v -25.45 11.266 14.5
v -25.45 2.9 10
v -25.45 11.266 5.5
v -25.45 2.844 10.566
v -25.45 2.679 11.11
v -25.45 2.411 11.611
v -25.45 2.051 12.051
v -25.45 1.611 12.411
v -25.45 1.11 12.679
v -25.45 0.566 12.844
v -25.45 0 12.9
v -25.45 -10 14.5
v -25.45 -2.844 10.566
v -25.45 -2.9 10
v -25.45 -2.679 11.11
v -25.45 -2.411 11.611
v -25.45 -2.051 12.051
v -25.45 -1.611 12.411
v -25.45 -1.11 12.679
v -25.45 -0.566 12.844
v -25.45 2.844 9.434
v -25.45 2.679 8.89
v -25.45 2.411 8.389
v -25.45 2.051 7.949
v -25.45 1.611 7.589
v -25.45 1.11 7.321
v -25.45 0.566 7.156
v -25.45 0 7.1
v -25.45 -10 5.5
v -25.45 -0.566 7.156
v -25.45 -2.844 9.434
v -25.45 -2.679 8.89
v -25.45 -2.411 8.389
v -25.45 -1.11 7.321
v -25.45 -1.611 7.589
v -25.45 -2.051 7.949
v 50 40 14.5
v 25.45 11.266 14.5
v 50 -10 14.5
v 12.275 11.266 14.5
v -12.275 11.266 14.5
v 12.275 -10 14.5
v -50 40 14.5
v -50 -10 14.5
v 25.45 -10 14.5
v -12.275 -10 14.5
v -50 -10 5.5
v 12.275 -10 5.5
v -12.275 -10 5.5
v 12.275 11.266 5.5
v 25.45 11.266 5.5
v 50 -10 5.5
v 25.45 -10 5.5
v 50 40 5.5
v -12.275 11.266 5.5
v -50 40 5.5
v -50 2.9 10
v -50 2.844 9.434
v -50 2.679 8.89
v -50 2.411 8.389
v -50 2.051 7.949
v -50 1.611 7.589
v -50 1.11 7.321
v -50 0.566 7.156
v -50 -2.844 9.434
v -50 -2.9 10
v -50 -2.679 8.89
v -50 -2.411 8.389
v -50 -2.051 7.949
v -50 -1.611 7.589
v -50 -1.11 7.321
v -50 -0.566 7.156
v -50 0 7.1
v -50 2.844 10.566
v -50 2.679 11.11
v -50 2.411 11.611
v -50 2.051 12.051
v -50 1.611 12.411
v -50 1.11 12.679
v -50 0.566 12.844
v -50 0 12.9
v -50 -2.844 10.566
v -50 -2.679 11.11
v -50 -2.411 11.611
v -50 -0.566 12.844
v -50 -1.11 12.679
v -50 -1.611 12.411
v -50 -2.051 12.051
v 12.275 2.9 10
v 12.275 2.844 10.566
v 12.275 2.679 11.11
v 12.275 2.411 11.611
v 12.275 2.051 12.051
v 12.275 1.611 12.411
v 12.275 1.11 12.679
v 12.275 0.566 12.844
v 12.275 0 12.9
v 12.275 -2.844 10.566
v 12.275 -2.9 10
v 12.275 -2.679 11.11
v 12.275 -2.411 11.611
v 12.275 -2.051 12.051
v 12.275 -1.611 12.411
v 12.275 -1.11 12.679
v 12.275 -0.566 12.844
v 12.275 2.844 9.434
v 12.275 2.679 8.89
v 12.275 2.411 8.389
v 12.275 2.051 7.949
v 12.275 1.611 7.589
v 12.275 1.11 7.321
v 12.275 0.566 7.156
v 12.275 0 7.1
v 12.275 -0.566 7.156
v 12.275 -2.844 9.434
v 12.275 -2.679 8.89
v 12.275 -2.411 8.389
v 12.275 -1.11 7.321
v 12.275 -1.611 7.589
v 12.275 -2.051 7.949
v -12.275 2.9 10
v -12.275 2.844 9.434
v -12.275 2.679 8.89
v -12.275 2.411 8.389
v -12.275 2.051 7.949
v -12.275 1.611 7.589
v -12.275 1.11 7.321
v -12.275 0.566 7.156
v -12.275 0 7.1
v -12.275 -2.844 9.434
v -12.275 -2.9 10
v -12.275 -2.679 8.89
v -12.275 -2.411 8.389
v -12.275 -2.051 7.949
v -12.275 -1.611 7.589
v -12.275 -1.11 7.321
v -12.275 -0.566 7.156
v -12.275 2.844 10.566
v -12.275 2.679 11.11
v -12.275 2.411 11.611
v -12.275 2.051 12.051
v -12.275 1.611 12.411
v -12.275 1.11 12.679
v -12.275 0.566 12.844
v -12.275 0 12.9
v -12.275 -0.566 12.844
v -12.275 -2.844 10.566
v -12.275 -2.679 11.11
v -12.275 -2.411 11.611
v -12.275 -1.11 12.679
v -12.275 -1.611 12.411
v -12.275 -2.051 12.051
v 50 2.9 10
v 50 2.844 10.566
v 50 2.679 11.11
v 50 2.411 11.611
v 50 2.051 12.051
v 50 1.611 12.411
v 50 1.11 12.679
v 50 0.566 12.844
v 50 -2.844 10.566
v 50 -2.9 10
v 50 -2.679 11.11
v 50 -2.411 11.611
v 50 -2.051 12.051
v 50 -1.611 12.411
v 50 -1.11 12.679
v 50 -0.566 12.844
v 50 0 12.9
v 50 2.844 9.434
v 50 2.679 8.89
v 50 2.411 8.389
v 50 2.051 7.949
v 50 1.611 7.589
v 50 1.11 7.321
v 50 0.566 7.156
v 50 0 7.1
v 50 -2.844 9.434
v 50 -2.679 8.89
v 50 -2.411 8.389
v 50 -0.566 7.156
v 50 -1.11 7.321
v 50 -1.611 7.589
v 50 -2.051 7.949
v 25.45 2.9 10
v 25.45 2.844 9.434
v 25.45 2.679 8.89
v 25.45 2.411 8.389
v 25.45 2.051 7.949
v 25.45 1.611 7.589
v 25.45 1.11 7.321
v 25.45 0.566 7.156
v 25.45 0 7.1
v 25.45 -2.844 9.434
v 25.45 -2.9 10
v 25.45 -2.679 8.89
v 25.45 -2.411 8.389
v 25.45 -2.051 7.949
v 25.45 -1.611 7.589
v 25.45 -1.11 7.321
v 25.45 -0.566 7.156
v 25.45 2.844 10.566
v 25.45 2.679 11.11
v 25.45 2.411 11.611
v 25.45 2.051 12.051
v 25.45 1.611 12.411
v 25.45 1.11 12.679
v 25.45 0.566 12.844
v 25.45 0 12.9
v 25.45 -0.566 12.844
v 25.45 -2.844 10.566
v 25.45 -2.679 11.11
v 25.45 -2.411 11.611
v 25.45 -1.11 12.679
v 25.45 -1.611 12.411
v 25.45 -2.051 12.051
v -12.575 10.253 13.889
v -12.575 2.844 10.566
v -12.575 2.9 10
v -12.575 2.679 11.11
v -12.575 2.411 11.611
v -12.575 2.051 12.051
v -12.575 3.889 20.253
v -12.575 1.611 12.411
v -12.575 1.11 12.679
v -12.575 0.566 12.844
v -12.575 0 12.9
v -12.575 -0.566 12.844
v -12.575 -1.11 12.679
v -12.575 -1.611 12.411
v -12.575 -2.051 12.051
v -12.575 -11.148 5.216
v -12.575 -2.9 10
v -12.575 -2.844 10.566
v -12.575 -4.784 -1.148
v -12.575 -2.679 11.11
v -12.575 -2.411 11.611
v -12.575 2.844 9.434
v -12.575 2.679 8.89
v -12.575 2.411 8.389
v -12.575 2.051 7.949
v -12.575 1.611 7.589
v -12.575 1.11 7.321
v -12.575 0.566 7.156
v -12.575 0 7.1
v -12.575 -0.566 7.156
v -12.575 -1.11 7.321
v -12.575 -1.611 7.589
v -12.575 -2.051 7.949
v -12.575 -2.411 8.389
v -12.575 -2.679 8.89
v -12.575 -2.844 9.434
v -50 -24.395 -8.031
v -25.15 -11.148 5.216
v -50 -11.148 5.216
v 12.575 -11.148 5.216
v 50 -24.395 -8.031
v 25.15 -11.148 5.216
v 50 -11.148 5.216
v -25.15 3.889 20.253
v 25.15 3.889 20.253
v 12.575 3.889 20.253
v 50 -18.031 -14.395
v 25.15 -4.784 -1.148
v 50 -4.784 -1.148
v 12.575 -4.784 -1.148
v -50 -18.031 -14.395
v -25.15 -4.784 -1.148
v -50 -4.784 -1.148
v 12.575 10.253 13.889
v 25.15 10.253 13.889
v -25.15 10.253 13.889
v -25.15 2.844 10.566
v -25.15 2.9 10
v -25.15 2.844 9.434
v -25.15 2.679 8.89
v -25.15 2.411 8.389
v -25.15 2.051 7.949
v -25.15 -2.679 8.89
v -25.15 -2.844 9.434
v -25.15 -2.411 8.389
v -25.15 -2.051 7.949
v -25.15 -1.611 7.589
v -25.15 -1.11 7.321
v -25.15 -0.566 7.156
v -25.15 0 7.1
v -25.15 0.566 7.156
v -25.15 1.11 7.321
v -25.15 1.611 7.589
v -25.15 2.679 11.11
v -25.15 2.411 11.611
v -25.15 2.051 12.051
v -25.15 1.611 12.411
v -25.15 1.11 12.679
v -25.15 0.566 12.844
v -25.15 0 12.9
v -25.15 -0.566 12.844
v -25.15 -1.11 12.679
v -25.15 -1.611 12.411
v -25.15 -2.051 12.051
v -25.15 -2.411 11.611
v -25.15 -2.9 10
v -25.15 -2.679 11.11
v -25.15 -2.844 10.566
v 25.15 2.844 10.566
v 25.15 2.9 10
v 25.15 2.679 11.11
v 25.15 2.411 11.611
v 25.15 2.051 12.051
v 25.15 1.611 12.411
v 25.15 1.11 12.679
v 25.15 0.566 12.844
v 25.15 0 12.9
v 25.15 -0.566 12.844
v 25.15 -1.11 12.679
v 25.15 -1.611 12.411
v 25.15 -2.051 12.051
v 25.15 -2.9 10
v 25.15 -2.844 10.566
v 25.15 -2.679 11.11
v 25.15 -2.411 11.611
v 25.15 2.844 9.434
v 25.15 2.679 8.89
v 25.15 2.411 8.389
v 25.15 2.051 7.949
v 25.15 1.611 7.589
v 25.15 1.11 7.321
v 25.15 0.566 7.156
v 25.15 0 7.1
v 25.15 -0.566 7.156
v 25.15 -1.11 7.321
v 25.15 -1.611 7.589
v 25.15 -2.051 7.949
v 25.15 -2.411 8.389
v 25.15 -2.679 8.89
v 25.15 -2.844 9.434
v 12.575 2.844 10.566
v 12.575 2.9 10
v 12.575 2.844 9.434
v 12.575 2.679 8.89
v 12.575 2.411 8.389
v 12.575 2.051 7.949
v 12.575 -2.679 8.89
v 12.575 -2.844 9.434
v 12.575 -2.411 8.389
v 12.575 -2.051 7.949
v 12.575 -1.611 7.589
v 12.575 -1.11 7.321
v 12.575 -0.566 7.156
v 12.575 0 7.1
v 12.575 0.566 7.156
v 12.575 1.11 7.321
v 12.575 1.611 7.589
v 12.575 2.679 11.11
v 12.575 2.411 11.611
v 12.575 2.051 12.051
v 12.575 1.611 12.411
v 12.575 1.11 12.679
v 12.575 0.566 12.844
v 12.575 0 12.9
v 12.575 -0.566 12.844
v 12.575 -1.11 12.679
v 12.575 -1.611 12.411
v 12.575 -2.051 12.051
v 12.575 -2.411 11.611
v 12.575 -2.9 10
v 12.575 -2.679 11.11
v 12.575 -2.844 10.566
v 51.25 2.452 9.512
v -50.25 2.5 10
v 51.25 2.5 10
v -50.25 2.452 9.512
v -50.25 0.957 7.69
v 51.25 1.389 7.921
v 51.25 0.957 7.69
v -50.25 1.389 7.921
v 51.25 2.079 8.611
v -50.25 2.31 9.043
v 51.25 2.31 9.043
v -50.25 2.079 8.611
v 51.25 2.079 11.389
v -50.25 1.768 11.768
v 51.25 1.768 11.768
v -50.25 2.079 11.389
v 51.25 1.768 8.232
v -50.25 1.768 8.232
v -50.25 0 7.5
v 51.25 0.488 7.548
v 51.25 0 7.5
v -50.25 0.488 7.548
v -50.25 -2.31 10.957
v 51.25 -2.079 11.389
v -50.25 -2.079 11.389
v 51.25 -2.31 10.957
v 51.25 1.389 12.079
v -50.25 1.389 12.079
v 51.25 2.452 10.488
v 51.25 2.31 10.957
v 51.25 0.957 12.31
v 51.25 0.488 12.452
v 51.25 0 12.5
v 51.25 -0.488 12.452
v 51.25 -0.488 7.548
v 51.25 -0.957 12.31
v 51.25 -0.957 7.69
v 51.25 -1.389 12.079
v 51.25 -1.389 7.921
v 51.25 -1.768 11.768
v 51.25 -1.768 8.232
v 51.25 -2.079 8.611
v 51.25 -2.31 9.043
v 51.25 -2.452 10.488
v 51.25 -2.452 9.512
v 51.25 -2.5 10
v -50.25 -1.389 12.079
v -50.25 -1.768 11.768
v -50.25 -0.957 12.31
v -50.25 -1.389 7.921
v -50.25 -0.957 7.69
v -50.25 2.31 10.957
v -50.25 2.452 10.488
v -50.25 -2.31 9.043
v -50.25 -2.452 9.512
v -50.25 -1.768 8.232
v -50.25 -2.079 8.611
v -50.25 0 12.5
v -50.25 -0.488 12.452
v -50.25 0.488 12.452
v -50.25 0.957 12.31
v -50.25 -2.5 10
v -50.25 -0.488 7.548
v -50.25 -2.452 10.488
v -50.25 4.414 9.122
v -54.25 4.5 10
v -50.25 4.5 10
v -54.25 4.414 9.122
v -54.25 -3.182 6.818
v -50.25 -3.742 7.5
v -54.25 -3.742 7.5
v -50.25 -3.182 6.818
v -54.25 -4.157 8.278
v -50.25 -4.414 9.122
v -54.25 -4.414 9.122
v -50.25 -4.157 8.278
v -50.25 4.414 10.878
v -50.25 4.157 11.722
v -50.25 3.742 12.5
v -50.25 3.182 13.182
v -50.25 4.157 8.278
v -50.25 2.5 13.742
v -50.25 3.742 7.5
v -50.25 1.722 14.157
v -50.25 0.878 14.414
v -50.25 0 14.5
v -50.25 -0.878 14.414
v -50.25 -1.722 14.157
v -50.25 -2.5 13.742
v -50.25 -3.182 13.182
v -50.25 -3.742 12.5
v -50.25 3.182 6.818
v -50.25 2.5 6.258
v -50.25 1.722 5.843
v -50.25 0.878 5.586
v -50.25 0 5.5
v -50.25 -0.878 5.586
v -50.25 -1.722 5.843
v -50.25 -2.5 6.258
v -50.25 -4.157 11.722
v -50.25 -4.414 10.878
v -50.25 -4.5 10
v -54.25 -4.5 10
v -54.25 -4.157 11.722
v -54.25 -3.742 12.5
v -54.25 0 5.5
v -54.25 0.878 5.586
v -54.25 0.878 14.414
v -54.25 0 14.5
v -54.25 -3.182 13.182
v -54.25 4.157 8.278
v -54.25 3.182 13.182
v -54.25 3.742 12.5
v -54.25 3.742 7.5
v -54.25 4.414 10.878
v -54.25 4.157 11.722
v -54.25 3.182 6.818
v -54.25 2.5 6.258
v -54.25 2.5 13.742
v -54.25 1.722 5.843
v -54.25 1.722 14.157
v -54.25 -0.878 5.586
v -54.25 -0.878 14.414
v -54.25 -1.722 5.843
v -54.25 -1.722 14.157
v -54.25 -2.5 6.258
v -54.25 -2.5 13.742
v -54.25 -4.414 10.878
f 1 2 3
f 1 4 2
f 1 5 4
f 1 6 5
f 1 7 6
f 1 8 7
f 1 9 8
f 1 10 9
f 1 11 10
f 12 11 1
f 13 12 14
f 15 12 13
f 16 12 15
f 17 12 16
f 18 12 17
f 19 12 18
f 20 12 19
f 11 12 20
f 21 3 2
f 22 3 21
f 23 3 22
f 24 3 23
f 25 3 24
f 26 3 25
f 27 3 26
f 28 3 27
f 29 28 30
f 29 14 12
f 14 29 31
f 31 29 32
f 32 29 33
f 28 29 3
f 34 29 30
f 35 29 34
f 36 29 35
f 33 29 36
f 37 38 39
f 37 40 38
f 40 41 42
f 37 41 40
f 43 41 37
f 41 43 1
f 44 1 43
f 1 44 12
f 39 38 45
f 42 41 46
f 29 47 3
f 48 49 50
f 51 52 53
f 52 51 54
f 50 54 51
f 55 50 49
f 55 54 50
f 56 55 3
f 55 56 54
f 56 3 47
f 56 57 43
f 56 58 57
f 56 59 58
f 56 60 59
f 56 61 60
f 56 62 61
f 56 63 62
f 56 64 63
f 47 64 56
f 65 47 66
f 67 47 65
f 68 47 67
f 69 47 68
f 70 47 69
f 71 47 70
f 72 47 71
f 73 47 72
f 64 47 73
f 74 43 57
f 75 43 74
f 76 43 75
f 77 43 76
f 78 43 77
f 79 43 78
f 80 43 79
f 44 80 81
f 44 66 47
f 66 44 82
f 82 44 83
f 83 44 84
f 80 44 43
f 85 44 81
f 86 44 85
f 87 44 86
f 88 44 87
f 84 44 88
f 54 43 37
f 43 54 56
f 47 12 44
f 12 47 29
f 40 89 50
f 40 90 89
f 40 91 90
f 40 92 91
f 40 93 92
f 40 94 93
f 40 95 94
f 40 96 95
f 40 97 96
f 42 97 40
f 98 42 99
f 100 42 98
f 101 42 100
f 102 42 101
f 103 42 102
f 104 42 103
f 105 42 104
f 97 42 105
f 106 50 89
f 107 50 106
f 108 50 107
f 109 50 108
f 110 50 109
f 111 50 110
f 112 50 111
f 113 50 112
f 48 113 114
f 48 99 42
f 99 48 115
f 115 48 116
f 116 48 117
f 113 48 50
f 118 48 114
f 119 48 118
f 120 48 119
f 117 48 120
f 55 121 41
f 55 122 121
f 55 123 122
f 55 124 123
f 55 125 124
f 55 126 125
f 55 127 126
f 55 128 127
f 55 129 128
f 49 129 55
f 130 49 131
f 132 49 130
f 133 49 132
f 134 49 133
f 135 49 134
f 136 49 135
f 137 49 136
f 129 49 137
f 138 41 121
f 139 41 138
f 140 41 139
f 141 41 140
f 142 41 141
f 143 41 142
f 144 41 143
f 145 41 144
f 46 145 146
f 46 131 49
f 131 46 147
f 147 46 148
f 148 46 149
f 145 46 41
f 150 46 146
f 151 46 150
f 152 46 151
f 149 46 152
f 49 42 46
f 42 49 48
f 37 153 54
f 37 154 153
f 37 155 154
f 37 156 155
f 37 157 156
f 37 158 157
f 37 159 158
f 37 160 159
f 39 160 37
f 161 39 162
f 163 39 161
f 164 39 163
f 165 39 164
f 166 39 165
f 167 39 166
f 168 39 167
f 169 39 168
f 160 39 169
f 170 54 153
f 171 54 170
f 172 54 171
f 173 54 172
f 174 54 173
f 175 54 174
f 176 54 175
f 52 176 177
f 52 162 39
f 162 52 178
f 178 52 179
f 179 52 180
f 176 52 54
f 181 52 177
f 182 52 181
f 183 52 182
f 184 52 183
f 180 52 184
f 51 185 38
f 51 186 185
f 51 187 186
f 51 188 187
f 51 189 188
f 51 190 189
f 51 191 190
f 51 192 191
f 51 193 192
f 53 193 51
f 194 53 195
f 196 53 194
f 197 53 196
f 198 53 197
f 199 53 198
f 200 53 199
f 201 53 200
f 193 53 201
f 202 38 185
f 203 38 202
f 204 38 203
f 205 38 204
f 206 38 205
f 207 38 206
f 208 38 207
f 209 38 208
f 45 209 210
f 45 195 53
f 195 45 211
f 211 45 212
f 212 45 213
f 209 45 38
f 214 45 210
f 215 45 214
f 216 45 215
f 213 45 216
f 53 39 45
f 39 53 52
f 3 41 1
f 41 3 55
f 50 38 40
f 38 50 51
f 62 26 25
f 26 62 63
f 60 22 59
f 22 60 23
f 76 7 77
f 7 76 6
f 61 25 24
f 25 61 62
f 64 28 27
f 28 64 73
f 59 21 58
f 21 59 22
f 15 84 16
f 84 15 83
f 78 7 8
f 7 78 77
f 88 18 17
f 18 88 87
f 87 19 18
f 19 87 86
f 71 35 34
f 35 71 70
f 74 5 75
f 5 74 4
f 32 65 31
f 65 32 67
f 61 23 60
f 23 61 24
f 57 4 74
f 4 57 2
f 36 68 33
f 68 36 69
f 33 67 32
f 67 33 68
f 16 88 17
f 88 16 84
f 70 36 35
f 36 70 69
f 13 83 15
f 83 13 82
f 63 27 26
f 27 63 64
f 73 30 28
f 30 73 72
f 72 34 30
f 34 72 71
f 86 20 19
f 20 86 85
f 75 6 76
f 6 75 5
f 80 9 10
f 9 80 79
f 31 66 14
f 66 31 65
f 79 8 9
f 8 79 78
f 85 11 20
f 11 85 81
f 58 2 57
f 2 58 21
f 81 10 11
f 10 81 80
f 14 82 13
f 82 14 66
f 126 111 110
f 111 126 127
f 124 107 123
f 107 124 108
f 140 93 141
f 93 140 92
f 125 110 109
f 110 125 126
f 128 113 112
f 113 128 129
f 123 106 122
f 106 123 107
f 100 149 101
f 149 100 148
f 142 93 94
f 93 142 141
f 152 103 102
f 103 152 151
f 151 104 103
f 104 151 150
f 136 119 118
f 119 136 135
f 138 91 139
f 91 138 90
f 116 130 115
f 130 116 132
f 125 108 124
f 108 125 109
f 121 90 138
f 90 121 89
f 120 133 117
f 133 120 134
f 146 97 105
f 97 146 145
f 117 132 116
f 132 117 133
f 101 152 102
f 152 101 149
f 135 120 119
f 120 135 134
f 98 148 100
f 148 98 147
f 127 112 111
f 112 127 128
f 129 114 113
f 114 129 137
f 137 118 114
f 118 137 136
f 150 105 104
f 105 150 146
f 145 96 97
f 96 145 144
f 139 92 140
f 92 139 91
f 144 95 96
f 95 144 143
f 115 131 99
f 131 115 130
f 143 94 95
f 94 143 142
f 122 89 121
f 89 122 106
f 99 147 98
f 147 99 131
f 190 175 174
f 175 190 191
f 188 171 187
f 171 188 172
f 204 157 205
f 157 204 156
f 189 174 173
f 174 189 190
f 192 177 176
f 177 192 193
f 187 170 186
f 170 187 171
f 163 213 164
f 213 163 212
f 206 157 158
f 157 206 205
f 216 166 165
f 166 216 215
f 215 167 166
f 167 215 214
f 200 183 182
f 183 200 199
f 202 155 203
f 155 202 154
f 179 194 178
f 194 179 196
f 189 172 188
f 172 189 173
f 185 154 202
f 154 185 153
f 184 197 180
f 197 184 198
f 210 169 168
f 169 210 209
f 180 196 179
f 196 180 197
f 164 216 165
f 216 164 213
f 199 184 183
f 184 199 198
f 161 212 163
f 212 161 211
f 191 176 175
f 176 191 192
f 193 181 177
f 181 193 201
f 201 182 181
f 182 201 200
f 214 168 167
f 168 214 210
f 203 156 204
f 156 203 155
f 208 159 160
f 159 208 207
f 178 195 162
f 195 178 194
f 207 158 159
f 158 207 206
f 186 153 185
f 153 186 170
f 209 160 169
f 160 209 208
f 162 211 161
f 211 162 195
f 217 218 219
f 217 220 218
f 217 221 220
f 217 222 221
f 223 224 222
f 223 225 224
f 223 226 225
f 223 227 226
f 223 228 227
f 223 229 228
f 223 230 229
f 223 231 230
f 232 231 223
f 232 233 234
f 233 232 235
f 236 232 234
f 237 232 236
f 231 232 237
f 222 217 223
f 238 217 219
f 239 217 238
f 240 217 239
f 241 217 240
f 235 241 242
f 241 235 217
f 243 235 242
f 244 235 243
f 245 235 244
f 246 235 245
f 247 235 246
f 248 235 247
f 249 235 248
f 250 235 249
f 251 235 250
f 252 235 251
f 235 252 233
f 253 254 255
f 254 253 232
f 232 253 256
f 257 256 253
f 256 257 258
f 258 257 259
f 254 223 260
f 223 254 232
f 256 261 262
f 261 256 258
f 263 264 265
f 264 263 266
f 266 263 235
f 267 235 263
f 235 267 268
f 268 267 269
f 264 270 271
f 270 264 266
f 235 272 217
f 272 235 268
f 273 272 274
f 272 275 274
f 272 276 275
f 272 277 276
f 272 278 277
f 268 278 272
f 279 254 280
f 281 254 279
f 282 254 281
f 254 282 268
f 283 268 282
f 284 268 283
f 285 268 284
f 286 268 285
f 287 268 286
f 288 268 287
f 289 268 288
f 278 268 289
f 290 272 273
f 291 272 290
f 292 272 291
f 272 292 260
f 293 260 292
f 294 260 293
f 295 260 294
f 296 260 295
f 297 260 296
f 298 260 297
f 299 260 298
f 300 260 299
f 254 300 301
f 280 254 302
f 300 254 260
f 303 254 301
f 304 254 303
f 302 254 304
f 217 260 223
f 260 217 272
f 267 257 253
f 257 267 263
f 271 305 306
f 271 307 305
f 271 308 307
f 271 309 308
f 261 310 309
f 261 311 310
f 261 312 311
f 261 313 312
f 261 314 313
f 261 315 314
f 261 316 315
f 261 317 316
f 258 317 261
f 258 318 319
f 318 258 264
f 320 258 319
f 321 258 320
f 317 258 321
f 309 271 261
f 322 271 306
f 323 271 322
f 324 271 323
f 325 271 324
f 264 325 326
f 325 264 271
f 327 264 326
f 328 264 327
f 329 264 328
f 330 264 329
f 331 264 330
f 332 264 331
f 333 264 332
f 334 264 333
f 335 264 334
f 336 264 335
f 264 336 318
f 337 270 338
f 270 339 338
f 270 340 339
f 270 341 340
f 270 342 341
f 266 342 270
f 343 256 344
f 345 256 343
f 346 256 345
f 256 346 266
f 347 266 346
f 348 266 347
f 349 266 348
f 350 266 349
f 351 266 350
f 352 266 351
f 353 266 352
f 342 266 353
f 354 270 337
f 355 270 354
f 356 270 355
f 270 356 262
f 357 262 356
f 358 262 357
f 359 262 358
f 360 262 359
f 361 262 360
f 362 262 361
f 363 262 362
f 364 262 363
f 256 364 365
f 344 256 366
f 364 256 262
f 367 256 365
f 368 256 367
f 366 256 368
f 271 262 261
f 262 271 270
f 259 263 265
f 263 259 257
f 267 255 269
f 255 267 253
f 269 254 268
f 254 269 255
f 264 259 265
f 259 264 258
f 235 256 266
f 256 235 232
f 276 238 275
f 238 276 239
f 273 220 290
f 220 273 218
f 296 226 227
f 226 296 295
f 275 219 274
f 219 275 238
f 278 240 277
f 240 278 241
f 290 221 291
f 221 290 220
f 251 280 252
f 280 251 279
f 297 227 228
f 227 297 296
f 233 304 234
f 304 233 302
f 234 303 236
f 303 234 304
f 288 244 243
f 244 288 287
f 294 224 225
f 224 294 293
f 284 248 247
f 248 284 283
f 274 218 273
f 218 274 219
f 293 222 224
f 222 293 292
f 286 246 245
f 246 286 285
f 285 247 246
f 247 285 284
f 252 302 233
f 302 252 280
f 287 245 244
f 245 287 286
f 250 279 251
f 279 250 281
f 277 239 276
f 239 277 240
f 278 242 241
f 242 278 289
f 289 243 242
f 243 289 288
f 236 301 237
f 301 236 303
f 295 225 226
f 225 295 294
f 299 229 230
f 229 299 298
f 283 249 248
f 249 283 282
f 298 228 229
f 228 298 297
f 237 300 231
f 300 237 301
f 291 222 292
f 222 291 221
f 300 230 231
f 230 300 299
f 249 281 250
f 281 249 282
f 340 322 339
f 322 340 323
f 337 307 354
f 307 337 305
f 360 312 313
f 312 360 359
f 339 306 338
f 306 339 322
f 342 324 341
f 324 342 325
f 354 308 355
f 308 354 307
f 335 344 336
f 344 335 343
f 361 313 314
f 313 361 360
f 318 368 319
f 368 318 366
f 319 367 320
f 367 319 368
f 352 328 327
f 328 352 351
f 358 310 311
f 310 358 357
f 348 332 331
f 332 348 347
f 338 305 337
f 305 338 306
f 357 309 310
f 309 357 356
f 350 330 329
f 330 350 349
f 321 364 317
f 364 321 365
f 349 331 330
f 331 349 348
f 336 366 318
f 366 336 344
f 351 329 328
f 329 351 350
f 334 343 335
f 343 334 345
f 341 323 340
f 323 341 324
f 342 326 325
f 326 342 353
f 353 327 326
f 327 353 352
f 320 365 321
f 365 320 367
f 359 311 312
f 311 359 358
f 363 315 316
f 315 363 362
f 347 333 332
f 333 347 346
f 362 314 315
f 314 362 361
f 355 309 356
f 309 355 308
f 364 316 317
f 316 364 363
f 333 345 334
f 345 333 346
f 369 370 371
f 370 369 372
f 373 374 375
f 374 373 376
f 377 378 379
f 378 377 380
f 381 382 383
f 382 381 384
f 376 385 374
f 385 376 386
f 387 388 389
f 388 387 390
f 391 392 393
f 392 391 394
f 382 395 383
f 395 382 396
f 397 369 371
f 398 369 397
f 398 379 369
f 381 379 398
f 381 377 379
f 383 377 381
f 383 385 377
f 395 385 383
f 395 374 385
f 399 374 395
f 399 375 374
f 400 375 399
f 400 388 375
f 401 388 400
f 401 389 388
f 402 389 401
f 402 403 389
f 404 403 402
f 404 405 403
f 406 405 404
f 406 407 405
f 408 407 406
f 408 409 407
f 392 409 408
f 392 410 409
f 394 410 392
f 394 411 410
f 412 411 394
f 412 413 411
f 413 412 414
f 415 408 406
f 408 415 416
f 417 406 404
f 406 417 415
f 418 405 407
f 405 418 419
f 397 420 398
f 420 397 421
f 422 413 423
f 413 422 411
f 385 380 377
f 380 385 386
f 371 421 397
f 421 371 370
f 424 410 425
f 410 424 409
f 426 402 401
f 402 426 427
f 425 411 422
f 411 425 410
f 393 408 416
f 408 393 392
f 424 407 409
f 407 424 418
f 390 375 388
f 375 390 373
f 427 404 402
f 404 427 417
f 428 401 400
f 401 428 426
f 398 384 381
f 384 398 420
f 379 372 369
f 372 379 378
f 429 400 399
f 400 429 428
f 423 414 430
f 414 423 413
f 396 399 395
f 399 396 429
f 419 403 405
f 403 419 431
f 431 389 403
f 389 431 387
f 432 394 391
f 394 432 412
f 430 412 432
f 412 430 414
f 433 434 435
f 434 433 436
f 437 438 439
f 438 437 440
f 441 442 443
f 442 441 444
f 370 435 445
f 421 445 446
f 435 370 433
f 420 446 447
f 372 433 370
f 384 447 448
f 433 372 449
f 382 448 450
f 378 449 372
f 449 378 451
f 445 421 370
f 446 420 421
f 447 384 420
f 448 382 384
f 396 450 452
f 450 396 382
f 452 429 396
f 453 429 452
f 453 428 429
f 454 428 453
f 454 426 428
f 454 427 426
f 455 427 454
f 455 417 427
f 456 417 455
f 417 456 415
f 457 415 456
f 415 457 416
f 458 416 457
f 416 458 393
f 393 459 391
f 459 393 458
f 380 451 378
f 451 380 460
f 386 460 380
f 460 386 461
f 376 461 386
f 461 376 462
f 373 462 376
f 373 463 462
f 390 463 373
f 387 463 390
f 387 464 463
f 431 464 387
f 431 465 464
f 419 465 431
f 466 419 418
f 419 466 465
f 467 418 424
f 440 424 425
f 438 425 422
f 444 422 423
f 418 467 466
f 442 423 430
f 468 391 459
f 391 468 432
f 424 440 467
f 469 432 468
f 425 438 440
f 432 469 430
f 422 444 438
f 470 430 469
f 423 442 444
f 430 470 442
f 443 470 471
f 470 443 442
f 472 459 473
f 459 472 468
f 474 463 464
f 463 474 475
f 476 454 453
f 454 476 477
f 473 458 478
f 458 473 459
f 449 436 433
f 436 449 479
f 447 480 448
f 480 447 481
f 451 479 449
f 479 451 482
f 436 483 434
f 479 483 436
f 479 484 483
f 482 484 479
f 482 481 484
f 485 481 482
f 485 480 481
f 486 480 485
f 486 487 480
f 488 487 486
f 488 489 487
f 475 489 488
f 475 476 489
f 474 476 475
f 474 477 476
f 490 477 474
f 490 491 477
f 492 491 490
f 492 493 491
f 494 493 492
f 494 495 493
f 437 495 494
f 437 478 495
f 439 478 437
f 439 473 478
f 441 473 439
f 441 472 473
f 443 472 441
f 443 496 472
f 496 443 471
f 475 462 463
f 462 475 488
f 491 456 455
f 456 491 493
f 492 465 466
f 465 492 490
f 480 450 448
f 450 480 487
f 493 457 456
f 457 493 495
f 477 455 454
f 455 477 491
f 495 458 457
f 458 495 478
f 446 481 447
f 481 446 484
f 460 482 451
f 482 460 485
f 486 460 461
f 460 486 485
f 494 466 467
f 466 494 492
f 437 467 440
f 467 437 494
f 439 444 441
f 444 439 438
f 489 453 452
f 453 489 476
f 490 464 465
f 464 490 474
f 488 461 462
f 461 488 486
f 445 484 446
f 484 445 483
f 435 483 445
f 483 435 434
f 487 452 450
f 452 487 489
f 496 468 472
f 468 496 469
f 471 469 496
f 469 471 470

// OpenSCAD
$fn = 32;

// ------------------------------------------------------------------------
// Butt hinge: hinge 100 mm, leaf swung 45 deg
// Every part is its own module, assembly() places every instance.
// ------------------------------------------------------------------------

// --- part 1 ---
module hinge_base() {
  difference() {
    union() {
      translate([-50, -10, -4.5]) cube([24.55, 50, 9]);
      translate([-12.275, -10, -4.5]) cube([24.55, 50, 9]);
      translate([25.45, -10, -4.5]) cube([24.55, 50, 9]);
      translate([-50, 11.266, -4.5]) cube([100, 28.734, 9]);
    }
    translate([-37.725, 0, 0]) rotate([0, 90, 0]) cylinder(h = 26.55, d = 5.8, center = true);
    translate([0, 0, 0]) rotate([0, 90, 0]) cylinder(h = 26.55, d = 5.8, center = true);
    translate([37.725, 0, 0]) rotate([0, 90, 0]) cylinder(h = 26.55, d = 5.8, center = true);
  }
}

// --- part 2 ---
module hinge_mover() {
  difference() {
    union() {
      translate([-25.15, -30, -4.5]) cube([12.575, 40, 9]);
      translate([12.575, -30, -4.5]) cube([12.575, 40, 9]);
      translate([-50, -30, -4.5]) cube([100, 18.734, 9]);
    }
    translate([-18.863, 0, 0]) rotate([0, 90, 0]) cylinder(h = 14.575, d = 5.8, center = true);
    translate([18.863, 0, 0]) rotate([0, 90, 0]) cylinder(h = 14.575, d = 5.8, center = true);
  }
}

// --- part 3 ---
module hinge_pin() {
  rotate([0, 90, 0]) cylinder(h = 102.5, d = 5, center = true);
  translate([-54.25, 0, 0]) rotate([0, 90, 0]) cylinder(h = 4, d = 9);
}

// --- assembly ---
module assembly() {
  color([0.80, 0.24, 0.20]) translate([0, 0, 10]) rotate([0, 0, 0]) hinge_base();
  color([0.20, 0.45, 0.75]) translate([0, 0, 10]) rotate([45, 0, 0]) hinge_mover();
  color([0.25, 0.62, 0.32]) translate([0, 0, 10]) rotate([0, 0, 0]) hinge_pin();
}

assembly();
